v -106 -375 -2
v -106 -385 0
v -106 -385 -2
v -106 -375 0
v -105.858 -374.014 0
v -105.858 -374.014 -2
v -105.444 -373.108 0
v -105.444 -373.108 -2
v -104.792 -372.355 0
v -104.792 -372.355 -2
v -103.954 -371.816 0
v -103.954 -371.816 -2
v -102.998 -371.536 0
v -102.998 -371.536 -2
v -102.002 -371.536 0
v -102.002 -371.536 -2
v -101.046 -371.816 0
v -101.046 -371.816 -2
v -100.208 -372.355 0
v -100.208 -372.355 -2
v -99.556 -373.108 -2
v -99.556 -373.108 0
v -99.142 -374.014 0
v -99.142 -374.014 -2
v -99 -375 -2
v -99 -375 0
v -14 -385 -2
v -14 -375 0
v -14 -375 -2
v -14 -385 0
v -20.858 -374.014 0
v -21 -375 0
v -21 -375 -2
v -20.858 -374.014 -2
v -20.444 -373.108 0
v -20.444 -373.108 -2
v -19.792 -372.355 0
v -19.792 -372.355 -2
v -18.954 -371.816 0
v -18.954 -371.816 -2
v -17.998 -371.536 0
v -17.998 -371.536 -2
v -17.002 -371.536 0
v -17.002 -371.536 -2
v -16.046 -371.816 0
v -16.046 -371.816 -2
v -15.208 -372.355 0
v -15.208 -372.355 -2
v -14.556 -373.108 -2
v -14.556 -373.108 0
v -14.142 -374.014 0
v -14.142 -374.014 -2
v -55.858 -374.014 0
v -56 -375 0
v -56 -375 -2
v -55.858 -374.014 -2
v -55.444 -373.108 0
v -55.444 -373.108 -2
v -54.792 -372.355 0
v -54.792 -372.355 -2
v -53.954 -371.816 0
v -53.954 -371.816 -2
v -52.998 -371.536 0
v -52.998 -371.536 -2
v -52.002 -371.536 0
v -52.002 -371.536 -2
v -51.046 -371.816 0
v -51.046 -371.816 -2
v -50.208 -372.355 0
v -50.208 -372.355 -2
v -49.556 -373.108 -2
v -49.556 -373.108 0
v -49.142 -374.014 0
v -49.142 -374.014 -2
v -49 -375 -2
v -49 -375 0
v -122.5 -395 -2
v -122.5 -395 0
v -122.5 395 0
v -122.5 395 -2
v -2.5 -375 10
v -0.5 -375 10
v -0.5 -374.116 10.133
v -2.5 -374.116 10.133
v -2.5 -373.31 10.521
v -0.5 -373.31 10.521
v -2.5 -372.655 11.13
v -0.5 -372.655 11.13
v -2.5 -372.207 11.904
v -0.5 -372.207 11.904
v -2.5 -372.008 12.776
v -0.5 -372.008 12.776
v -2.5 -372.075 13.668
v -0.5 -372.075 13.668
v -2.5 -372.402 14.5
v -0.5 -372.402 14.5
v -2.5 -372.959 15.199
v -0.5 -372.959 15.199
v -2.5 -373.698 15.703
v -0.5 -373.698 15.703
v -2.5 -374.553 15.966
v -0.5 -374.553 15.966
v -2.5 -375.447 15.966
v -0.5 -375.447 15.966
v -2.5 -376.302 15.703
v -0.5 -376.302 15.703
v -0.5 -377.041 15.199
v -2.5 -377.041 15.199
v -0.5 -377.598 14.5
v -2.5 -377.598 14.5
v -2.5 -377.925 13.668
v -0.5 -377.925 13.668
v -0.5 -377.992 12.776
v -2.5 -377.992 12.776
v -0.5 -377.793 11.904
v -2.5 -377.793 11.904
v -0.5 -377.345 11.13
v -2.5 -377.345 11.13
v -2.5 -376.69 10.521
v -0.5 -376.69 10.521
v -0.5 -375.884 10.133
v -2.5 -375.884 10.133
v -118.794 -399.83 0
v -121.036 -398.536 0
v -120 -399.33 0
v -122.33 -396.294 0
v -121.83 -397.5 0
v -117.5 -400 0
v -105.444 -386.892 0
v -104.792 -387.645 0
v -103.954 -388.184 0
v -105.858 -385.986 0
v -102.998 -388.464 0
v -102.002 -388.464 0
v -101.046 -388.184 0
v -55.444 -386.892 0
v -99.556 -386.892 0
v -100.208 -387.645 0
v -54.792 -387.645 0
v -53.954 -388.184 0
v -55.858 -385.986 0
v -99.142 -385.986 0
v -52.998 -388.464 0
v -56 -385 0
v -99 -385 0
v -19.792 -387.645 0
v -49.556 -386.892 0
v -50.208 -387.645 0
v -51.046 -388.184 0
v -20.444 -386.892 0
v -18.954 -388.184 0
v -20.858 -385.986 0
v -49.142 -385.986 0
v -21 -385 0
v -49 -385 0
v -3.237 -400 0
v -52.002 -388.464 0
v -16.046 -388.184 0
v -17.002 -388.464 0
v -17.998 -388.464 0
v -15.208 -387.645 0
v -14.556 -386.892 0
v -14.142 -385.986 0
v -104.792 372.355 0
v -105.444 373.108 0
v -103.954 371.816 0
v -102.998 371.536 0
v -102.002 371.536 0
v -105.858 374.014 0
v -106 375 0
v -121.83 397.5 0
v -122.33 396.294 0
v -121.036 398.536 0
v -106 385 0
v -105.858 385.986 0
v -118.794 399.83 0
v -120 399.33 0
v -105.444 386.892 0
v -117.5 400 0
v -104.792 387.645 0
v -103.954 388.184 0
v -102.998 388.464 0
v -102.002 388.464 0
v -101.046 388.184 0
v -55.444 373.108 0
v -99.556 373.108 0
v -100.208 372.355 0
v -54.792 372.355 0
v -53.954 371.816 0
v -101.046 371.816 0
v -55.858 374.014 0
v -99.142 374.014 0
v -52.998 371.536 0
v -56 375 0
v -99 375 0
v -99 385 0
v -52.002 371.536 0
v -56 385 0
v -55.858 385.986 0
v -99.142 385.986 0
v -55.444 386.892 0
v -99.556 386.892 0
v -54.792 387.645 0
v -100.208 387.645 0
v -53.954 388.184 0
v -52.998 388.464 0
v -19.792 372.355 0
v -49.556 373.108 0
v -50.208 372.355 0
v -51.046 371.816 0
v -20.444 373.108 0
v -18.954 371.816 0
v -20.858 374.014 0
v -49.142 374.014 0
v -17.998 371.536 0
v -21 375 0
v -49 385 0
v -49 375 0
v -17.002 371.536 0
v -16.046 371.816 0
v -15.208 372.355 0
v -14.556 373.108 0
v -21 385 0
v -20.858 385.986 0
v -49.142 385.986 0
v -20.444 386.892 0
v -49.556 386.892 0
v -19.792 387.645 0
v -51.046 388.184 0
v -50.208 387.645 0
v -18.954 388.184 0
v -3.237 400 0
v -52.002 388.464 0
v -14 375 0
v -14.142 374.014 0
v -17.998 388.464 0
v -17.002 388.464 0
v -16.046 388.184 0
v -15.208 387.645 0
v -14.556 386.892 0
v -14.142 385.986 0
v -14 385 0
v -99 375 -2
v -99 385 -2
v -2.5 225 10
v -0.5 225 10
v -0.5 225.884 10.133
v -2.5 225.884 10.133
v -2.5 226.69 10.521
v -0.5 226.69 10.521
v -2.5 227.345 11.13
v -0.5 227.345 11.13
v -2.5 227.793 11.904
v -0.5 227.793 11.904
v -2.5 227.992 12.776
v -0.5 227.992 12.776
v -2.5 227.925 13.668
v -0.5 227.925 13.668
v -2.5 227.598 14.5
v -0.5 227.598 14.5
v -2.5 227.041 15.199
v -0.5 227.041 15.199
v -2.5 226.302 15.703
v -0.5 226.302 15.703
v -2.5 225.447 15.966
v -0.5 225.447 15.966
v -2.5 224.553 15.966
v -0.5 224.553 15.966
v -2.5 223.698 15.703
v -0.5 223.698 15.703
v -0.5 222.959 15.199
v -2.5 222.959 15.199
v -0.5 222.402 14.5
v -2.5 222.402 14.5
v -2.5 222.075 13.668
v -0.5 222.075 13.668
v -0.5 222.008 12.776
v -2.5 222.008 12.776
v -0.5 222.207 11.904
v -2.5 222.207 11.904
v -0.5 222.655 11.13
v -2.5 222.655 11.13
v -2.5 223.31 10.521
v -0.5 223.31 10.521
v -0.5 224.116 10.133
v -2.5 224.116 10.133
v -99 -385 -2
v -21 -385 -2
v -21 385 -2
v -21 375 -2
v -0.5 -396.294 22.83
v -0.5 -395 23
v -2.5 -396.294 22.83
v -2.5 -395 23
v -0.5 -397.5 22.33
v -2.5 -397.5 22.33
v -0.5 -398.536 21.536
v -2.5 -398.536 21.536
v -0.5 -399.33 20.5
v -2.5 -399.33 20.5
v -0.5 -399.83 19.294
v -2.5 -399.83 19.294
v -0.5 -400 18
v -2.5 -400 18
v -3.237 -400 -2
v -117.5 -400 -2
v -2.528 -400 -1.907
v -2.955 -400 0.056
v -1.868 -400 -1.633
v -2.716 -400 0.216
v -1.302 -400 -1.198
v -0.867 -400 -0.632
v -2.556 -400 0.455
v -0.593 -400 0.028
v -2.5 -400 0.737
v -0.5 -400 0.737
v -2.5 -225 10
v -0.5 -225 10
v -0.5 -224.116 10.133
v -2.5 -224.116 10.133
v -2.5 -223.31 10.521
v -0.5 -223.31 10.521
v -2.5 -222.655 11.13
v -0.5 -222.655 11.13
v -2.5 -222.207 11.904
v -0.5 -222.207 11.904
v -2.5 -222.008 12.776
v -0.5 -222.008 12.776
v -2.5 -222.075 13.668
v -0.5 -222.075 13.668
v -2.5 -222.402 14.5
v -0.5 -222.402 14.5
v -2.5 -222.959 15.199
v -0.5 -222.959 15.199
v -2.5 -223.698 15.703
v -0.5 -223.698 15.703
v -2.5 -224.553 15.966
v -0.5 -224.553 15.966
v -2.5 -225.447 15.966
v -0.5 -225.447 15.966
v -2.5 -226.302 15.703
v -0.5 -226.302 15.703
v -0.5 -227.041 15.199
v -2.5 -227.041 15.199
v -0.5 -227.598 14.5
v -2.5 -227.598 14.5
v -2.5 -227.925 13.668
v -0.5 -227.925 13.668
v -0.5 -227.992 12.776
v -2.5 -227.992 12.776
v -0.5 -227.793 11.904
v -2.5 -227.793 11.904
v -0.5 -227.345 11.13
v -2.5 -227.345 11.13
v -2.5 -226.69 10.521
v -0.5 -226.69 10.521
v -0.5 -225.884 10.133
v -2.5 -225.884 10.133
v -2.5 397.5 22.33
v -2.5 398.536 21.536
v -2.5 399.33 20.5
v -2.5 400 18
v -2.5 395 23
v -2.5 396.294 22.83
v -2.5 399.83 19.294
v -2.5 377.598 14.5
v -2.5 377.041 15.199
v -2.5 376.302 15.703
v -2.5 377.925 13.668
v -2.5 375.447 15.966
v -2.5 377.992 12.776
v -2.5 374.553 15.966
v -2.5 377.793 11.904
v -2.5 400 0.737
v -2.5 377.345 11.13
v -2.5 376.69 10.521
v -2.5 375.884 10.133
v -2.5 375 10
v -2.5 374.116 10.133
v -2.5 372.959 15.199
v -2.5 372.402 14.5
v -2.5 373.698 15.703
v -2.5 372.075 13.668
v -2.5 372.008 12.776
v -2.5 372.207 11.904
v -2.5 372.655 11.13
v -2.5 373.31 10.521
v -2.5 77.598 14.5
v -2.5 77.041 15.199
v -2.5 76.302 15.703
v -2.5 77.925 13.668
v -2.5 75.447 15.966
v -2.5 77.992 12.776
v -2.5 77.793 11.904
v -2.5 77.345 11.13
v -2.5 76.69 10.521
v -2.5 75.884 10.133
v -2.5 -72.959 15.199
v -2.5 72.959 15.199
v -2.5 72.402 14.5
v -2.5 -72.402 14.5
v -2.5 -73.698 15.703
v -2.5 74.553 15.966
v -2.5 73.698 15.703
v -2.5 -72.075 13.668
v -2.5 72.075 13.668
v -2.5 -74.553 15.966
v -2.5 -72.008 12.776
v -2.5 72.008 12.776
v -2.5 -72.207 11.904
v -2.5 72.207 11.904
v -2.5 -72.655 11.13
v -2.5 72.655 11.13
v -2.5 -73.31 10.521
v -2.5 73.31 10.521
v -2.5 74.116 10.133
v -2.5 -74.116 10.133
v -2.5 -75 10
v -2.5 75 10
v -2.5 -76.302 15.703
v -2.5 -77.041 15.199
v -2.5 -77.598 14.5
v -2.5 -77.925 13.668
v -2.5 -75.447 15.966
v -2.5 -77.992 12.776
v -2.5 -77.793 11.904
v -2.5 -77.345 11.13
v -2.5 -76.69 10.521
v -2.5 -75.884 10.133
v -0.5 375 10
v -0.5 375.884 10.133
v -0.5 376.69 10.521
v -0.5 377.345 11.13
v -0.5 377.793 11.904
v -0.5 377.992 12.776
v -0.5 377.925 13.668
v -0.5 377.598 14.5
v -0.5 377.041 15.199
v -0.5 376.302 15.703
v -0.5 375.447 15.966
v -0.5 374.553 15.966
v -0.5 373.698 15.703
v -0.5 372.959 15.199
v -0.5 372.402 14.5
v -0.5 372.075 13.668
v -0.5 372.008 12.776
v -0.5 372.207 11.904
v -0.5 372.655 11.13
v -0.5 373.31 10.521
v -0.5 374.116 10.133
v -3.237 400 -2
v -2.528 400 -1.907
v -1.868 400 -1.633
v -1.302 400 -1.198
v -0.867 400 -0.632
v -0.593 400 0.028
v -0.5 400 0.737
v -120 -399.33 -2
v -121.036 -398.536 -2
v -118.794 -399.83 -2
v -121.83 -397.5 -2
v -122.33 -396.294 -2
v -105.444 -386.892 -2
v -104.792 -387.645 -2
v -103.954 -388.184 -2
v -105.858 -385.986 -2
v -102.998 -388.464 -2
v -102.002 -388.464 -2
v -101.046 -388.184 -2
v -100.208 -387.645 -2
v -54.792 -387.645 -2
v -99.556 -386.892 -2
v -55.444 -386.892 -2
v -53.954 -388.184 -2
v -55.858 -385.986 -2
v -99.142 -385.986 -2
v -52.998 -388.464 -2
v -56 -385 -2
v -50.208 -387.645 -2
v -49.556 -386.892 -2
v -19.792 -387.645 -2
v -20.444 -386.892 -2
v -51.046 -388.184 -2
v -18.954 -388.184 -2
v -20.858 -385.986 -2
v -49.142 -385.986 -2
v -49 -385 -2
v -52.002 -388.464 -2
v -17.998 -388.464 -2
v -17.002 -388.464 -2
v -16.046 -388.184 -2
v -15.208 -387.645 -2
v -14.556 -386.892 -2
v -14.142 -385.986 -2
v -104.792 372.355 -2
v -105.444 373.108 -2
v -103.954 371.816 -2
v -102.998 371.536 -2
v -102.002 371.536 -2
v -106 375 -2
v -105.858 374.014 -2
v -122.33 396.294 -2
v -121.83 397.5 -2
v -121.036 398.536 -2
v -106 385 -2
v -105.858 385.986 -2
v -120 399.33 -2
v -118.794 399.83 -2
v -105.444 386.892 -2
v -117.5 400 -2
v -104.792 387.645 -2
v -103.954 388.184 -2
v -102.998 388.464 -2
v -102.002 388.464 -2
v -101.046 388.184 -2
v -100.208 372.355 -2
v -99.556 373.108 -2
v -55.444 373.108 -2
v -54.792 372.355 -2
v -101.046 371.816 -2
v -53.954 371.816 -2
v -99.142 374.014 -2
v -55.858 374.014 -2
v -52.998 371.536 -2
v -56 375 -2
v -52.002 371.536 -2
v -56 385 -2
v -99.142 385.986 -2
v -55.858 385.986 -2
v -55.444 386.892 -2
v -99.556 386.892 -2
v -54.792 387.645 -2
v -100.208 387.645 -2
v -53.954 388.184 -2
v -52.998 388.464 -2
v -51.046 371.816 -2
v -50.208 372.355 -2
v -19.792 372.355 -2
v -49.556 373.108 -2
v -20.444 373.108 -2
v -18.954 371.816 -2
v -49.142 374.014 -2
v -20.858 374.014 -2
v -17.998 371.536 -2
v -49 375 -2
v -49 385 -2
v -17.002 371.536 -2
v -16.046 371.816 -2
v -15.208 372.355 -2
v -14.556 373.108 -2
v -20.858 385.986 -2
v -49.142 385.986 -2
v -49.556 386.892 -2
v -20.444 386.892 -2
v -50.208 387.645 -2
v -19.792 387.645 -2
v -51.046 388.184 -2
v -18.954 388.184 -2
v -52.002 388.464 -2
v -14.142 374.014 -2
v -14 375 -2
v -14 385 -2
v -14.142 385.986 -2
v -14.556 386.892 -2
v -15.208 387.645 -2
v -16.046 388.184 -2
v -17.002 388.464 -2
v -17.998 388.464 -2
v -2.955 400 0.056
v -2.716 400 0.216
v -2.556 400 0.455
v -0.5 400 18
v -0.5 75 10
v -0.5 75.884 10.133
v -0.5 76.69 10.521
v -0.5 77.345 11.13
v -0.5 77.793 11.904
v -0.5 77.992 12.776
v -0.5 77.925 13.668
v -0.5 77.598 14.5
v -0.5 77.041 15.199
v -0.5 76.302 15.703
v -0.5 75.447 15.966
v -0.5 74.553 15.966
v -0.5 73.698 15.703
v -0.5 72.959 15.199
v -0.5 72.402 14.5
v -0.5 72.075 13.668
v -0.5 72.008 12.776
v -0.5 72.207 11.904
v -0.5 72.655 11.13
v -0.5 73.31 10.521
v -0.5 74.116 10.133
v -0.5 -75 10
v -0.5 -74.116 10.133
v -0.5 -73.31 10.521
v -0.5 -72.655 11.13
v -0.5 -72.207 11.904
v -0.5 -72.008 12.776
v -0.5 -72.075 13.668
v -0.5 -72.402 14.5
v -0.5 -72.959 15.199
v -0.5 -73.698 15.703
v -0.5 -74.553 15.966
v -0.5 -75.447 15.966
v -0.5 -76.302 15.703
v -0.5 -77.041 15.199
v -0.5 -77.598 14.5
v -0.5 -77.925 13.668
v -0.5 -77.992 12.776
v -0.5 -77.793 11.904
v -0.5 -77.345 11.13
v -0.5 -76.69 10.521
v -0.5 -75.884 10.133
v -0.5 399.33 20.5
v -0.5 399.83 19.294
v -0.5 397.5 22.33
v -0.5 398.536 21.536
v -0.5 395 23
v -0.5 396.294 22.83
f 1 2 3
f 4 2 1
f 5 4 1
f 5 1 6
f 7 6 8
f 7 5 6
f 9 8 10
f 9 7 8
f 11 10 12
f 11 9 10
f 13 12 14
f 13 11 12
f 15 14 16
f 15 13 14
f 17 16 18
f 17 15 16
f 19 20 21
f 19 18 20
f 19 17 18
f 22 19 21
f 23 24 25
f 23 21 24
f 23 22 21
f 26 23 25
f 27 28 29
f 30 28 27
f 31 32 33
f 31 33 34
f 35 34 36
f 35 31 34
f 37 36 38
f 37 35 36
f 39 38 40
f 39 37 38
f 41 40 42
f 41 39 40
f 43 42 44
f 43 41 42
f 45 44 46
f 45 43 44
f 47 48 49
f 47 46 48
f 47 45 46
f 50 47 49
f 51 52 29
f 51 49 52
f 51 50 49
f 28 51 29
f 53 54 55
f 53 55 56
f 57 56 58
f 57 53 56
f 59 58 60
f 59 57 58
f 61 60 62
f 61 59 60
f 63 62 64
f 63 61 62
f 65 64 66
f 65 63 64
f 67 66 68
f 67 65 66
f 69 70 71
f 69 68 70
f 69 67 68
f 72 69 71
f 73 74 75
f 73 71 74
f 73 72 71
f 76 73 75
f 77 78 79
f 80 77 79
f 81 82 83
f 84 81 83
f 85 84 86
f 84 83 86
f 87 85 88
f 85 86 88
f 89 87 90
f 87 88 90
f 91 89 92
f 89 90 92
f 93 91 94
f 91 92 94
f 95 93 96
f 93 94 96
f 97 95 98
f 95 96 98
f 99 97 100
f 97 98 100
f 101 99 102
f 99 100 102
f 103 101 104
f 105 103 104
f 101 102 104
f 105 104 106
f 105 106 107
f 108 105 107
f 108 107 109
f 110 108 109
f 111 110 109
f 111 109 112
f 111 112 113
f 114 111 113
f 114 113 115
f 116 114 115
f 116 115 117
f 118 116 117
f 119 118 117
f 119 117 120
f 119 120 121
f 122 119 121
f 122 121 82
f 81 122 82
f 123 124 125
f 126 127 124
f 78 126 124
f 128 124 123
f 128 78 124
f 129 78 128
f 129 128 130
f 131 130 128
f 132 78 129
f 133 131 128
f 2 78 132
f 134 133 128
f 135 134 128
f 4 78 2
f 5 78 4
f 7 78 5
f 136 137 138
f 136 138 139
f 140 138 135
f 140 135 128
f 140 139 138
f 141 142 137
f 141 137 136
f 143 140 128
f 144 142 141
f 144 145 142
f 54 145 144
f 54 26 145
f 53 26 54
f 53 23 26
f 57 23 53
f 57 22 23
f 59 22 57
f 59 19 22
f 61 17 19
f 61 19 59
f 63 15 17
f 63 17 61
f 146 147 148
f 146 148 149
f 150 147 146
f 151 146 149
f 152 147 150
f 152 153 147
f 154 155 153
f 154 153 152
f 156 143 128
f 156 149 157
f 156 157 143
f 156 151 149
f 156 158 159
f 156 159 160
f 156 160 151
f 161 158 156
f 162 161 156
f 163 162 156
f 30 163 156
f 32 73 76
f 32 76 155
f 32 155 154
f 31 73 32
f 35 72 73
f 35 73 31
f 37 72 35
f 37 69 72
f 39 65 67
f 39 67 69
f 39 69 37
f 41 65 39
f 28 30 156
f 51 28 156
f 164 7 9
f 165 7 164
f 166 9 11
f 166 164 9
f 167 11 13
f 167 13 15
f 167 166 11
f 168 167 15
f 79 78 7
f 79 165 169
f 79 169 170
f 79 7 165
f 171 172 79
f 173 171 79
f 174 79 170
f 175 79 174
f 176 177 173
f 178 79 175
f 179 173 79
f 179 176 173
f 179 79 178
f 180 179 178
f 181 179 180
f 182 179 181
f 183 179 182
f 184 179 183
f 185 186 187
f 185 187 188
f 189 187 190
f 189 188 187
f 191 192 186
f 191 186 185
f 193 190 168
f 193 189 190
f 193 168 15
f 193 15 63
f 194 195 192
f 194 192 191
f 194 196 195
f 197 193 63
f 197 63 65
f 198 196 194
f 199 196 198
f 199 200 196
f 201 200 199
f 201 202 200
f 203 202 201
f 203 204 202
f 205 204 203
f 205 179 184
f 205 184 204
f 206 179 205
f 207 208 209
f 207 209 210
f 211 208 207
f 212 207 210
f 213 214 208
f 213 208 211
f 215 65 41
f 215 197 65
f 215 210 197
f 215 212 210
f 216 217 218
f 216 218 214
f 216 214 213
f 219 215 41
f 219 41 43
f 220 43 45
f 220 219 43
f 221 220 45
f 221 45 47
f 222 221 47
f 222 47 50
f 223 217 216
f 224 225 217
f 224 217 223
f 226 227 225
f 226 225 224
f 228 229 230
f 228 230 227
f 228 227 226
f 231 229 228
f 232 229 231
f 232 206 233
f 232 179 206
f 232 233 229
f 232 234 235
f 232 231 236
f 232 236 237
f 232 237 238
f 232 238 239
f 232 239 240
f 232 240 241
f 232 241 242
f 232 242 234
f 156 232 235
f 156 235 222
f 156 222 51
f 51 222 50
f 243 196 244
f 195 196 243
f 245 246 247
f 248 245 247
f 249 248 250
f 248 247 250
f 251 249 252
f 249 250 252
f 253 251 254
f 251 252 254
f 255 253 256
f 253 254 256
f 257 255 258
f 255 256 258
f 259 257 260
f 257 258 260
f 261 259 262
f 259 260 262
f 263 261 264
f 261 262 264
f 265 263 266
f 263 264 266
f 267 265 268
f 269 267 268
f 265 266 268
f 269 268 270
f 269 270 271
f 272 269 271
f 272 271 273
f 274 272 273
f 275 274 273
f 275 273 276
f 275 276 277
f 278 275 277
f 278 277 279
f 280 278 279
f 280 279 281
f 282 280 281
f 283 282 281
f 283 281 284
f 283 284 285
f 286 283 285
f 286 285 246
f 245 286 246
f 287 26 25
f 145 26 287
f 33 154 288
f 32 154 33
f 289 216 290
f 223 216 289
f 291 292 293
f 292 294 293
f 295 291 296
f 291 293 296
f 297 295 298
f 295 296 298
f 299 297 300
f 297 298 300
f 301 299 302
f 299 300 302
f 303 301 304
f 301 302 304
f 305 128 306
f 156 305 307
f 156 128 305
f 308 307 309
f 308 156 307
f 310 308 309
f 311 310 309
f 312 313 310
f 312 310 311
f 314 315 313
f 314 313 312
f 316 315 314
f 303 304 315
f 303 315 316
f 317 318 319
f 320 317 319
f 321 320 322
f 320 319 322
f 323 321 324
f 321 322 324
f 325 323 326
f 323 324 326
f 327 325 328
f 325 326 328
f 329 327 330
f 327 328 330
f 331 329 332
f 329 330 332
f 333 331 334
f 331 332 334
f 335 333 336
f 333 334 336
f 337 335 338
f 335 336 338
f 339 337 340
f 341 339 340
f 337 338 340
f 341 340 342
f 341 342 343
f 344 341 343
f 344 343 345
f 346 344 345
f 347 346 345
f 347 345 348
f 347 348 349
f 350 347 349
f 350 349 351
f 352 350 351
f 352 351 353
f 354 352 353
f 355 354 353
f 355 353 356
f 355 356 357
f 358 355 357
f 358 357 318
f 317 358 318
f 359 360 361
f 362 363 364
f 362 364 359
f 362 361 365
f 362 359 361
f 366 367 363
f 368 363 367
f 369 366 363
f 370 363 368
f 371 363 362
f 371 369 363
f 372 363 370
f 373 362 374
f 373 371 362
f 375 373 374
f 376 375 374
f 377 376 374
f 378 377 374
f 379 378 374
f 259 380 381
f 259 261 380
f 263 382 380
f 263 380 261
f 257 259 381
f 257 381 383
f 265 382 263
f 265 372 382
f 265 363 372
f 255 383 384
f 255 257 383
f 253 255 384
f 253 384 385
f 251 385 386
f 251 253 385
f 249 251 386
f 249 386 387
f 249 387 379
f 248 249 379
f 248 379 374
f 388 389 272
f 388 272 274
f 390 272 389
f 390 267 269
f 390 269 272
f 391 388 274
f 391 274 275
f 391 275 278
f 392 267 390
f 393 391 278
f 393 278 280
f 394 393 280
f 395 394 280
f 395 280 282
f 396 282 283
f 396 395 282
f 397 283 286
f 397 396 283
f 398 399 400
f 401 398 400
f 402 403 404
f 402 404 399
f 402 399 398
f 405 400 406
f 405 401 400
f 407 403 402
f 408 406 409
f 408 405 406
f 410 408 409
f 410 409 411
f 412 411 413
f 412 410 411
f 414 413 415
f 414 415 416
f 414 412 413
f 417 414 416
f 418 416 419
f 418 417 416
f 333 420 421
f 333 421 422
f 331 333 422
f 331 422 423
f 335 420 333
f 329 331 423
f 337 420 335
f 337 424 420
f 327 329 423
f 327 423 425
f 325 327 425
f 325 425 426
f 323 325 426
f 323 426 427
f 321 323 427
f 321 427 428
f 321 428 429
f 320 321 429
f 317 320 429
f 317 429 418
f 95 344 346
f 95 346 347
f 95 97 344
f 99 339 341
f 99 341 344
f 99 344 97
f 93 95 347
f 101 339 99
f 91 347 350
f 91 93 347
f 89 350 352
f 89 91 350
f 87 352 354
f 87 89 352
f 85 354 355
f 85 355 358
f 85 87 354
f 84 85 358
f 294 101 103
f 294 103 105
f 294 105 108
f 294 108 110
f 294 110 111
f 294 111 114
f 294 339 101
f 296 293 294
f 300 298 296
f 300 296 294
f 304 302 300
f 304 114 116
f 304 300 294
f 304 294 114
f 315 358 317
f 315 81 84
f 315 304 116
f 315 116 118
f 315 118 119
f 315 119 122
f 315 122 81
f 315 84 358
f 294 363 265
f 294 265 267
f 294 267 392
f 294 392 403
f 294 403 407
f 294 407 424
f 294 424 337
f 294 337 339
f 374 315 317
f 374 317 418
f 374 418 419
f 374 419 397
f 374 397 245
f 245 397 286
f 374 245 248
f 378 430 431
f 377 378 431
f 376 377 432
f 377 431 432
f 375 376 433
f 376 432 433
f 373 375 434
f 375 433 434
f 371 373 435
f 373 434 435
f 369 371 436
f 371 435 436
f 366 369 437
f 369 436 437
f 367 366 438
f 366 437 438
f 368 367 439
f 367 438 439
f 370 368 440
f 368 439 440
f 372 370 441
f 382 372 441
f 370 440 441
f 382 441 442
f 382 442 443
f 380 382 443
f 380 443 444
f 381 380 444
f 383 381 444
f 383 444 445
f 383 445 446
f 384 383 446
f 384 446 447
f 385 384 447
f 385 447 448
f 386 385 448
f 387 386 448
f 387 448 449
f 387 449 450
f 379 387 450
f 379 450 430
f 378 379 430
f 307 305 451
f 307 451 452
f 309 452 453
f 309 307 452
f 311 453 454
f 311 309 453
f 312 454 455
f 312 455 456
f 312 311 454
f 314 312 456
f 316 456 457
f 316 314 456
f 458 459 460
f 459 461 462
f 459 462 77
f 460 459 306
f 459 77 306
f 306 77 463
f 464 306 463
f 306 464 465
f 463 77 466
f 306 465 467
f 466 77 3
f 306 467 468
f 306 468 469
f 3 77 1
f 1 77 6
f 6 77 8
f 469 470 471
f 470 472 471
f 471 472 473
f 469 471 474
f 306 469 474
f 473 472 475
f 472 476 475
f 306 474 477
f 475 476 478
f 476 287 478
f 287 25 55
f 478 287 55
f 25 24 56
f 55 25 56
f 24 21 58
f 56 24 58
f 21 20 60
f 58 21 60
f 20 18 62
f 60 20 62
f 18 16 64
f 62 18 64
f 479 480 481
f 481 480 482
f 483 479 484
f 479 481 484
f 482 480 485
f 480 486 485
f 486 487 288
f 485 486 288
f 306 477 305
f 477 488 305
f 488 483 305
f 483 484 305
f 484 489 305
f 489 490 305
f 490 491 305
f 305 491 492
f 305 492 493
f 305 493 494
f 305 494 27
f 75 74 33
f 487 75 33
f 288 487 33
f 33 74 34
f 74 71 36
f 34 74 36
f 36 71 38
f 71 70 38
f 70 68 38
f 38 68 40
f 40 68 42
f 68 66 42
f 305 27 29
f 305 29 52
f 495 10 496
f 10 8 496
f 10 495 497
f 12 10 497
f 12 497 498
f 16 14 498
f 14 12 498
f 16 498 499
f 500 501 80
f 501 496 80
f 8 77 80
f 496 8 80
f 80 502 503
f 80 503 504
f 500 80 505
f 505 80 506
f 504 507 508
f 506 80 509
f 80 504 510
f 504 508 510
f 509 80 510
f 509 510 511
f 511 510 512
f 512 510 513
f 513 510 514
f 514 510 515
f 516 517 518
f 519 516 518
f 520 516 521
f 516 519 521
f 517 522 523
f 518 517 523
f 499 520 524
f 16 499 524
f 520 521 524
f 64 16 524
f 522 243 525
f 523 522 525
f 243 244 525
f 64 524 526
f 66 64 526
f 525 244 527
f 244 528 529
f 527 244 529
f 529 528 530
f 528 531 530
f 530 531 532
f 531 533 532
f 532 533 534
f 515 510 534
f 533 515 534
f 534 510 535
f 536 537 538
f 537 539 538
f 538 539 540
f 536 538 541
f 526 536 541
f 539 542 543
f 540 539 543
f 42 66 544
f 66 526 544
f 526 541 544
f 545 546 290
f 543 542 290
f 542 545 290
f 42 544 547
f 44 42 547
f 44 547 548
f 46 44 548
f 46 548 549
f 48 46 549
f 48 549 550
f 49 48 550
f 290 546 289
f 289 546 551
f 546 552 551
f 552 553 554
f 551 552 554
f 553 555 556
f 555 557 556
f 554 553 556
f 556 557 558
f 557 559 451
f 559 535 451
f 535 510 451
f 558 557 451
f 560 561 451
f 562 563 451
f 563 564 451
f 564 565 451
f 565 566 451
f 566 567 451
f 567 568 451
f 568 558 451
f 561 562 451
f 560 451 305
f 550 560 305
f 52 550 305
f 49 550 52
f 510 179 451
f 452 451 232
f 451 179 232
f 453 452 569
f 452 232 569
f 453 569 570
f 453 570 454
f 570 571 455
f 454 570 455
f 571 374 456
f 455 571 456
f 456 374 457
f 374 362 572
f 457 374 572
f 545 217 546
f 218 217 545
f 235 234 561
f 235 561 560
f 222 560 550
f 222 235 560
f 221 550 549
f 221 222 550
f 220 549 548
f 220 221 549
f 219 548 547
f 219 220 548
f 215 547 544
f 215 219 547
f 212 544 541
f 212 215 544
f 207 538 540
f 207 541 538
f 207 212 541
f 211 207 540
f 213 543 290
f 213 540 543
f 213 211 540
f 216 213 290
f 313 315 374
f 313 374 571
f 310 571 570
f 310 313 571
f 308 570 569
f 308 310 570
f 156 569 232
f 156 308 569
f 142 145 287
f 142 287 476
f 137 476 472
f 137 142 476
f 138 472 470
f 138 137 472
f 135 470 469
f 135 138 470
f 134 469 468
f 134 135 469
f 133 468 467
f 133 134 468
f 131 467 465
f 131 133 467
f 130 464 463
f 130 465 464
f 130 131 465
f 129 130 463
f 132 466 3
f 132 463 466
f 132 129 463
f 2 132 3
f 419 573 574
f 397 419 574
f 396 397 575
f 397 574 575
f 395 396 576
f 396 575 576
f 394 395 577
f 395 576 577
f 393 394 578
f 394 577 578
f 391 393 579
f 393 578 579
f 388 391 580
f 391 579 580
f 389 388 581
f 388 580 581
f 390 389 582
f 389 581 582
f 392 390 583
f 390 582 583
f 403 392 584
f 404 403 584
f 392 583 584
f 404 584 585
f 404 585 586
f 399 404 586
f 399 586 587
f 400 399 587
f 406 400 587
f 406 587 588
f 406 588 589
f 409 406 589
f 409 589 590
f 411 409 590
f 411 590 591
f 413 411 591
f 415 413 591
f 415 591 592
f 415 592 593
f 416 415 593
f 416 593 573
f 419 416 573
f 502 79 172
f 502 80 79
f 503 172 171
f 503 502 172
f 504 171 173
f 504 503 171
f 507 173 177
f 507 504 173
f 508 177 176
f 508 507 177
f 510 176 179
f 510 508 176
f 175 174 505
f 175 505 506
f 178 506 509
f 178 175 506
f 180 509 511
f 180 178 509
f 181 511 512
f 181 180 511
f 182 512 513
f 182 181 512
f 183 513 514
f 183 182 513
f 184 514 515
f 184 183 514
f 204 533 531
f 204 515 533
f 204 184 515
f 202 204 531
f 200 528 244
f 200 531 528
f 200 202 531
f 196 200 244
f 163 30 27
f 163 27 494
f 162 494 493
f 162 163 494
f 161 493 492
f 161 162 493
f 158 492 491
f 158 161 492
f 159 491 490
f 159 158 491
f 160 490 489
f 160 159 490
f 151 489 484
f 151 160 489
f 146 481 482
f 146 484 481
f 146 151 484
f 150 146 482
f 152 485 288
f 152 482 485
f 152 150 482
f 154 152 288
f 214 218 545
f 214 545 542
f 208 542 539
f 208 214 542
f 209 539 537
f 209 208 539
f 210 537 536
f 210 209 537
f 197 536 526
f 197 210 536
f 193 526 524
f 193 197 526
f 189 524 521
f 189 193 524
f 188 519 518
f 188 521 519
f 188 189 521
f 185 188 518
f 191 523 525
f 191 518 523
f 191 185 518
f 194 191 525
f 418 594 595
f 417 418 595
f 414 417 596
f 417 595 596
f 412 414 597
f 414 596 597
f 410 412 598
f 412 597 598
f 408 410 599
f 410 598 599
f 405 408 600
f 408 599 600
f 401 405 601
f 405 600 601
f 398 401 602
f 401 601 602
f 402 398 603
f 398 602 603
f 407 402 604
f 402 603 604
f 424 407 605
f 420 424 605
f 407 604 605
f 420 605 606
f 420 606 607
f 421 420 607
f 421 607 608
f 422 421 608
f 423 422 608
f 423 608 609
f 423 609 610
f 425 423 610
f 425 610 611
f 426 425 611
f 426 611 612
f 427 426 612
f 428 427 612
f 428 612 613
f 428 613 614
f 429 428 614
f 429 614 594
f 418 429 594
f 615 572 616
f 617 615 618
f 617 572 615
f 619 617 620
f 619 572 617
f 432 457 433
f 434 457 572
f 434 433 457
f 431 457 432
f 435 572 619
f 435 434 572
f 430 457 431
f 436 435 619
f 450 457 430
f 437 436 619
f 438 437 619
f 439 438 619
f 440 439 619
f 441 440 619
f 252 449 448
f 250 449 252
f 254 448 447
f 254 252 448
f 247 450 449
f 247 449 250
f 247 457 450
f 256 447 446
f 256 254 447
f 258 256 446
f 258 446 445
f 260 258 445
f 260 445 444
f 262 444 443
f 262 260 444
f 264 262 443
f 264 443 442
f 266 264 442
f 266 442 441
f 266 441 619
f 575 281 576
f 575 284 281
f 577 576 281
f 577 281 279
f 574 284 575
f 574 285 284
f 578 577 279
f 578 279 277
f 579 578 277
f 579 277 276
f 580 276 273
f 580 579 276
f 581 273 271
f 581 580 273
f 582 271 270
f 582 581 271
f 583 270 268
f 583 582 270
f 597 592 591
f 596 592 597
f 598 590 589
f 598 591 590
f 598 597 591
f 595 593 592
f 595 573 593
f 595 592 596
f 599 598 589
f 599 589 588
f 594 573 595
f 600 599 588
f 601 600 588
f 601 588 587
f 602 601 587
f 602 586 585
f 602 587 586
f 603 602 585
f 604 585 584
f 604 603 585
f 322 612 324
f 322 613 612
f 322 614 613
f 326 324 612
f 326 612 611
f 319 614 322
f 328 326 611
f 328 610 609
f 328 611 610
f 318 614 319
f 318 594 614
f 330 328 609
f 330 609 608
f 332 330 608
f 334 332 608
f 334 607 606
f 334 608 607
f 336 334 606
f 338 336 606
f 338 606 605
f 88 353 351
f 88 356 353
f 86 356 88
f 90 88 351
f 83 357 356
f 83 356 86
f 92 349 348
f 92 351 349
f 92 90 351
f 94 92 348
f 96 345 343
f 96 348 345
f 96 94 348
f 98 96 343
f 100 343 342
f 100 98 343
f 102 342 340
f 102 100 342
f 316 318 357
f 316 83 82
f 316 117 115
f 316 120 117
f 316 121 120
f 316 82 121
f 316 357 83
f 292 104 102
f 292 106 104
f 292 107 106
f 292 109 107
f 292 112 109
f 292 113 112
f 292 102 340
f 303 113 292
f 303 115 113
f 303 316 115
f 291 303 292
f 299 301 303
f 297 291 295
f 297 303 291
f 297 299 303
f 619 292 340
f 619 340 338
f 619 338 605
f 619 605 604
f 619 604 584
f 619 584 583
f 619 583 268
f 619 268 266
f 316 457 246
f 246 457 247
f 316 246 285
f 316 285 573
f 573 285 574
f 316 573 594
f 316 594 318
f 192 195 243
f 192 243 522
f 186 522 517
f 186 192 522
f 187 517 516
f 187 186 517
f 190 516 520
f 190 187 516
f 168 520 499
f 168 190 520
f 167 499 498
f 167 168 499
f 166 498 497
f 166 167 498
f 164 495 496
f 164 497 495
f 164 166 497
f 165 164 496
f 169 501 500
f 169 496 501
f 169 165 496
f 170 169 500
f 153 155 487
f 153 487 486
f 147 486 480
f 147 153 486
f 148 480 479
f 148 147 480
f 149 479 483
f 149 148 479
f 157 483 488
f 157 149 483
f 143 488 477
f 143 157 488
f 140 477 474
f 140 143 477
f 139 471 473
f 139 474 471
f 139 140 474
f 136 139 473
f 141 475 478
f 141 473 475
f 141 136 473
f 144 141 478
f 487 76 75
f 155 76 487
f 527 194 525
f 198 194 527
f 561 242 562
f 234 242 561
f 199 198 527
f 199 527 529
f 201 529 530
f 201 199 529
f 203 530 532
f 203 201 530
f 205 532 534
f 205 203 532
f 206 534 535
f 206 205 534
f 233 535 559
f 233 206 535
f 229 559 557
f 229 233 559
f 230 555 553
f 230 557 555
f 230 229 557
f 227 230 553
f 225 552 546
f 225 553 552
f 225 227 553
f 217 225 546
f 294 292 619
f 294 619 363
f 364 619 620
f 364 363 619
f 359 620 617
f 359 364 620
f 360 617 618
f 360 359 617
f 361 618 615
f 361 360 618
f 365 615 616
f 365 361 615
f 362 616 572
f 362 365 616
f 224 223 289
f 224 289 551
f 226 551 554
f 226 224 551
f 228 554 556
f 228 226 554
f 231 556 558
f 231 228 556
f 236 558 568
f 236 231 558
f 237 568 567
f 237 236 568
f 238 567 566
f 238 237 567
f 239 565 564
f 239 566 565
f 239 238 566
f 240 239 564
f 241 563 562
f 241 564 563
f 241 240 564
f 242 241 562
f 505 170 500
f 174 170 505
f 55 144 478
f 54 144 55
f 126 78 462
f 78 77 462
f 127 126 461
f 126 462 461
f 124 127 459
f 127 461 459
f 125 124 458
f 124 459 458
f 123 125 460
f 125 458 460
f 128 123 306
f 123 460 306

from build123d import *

# Parameters (mm, degrees)
SKETCH_1_W                       = 245
SKETCH_1_H                       = 800
SM_BASE_FLANGE_1_DEPTH           = 2
FILLET_1_R                       = 5
SKETCH_2_W                       = 1
SKETCH_2_H                       = 854.013811654
CUT_EXTRUDE_1_DEPTH              = 10
SKETCH_3_W                       = 130
SKETCH_3_H                       = 800.320249097
CUT_EXTRUDE_2_DEPTH              = 10
SM_EDGE_FLANGE_1_STRIP_W         = 9.4732
SM_EDGE_FLANGE_1_STRIP_H         = 2
SM_EDGE_FLANGE_1_STRIP_CUT_DEPTH = 800
SM_EDGE_FLANGE_1_DEPTH           = 800
FILLET_2_R                       = 5
CUT_EXTRUDE_3_DEPTH              = 10
HOLE_WIZARD_6_0_6_1_D            = 6
PATTERN_LINEAR_1_COUNT           = 6
PATTERN_LINEAR_1_PITCH           = 150


# Sheet-metal steps are written as plain solids
with BuildPart() as part:
    # Sketch 1 → 基体-法兰1 (new body)
    with BuildSketch(Plane.XY):
        Rectangle(SKETCH_1_W, SKETCH_1_H)
    extrude(amount=-SM_BASE_FLANGE_1_DEPTH)

    # 圆角1
    fillet_1_edges = [part.edges().sort_by_distance(p)[0] for p in [
        (-122.5, 400, -1),
        (122.5, 400, -1),
        (122.5, -400, -1),
        (-122.5, -400, -1),
    ]]
    fillet(fillet_1_edges, radius=FILLET_1_R)

    # Sketch 2 → 切除-拉伸1 (cut)
    with BuildSketch(Plane.XY):
        Rectangle(SKETCH_2_W, SKETCH_2_H)
    extrude(amount=-CUT_EXTRUDE_1_DEPTH, mode=Mode.SUBTRACT)


with BuildPart() as cut_extrude_1_piece_1:
    # of the separate pieces the step leaves, piece 1, a body of its own (cut_extrude_1_pieces)
    add(part.part.solids().sort_by_distance((-0.5, -400, 0))[0])

    # 边线-法兰1 strip (across the edge) → 边线-法兰1 strip cut (cut)
    with BuildSketch(Plane(origin=(-0.5, -400, 0), x_dir=(-1, 0, 0), z_dir=(0, 1, 0))):
        with Locations((-2, -1)):
            Rectangle(SM_EDGE_FLANGE_1_STRIP_W, SM_EDGE_FLANGE_1_STRIP_H)
    extrude(amount=SM_EDGE_FLANGE_1_STRIP_CUT_DEPTH, mode=Mode.SUBTRACT)

    # 边线-法兰1 section (across the edge) → 边线-法兰1 (add)
    with BuildSketch(Plane(origin=(-0.5, -400, 0), x_dir=(-1, 0, 0), z_dir=(0, 1, 0))):
        with BuildLine():
            Line((0, 0.7366), (0, 23))
            Line((0, 23), (2, 23))
            Line((2, 23), (2, 0.7366))
            ThreePointArc((2, 0.7366), (2.215745145, 0.215745145), (2.7366, 0))
            Line((2.7366, 0), (2.7366, -2))
            ThreePointArc((2.7366, -2), (0.801531583, -1.198468417), (0, 0.7366))
        make_face()
    extrude(amount=SM_EDGE_FLANGE_1_DEPTH)

    # 圆角2
    fillet_2_edges = [cut_extrude_1_piece_1.edges().sort_by_distance(p)[0] for p in [
        (-1.5, -400, 23),
        (-1.5, 400, 23),
    ]]
    fillet(fillet_2_edges, radius=FILLET_2_R)

    # 草图9 → 切除-拉伸3 (cut)
    with BuildSketch(Plane.XY):
        with BuildLine():
            Line((-99, 385), (-99, 375))
            ThreePointArc((-99, 375), (-102.5, 371.5), (-106, 375))
            Line((-106, 375), (-106, 385))
            ThreePointArc((-106, 385), (-102.5, 388.5), (-99, 385))
        make_face()
        with BuildLine():
            Line((-49, 385), (-49, 375))
            ThreePointArc((-49, 375), (-52.5, 371.5), (-56, 375))
            Line((-56, 375), (-56, 385))
            ThreePointArc((-56, 385), (-52.5, 388.5), (-49, 385))
        make_face()
        with BuildLine():
            Line((-106, -385), (-106, -375))
            ThreePointArc((-106, -375), (-102.5, -371.5), (-99, -375))
            Line((-99, -375), (-99, -385))
            ThreePointArc((-99, -385), (-102.5, -388.5), (-106, -385))
        make_face()
        with BuildLine():
            Line((-21, 375), (-21, 385))
            ThreePointArc((-21, 385), (-17.5, 388.5), (-14, 385))
            Line((-14, 385), (-14, 375))
            ThreePointArc((-14, 375), (-17.5, 371.5), (-21, 375))
        make_face()
        with BuildLine():
            Line((-14, -375), (-14, -385))
            ThreePointArc((-14, -385), (-17.5, -388.5), (-21, -385))
            Line((-21, -385), (-21, -375))
            ThreePointArc((-21, -375), (-17.5, -371.5), (-14, -375))
        make_face()
        with BuildLine():
            Line((-56, -385), (-56, -375))
            ThreePointArc((-56, -375), (-52.5, -371.5), (-49, -375))
            Line((-49, -375), (-49, -385))
            ThreePointArc((-49, -385), (-52.5, -388.5), (-56, -385))
        make_face()
    extrude(amount=-CUT_EXTRUDE_3_DEPTH, mode=Mode.SUBTRACT)

    # Ø6.0 (6) 直径孔1 (through all)
    with Locations(Plane.ZY.offset(2.5)):
        with Locations((13, 375)):
            hole_wizard_6_0_6_1 = Hole(HOLE_WIZARD_6_0_6_1_D / 2)

    # 阵列(线性)1: Ø6.0 (6) 直径孔1 ×6
    with Locations(*[(0, -i * PATTERN_LINEAR_1_PITCH, 0) for i in range(1, PATTERN_LINEAR_1_COUNT)]):
        add(hole_wizard_6_0_6_1, mode=Mode.SUBTRACT)


with BuildPart() as cut_extrude_1_piece_2:
    # of the separate pieces the step leaves, piece 2, a body of its own (cut_extrude_1_pieces)
    add(part.part.solids().sort_by_distance((117.5, -400, 0))[0])

    # Sketch 3 → 切除-拉伸2 (cut)
    with BuildSketch(Plane.XY):
        with Locations((65.5, -0.160124549)):
            Rectangle(SKETCH_3_W, SKETCH_3_H)
    extrude(amount=-CUT_EXTRUDE_2_DEPTH, mode=Mode.SUBTRACT)


solid = cut_extrude_1_piece_1.part
